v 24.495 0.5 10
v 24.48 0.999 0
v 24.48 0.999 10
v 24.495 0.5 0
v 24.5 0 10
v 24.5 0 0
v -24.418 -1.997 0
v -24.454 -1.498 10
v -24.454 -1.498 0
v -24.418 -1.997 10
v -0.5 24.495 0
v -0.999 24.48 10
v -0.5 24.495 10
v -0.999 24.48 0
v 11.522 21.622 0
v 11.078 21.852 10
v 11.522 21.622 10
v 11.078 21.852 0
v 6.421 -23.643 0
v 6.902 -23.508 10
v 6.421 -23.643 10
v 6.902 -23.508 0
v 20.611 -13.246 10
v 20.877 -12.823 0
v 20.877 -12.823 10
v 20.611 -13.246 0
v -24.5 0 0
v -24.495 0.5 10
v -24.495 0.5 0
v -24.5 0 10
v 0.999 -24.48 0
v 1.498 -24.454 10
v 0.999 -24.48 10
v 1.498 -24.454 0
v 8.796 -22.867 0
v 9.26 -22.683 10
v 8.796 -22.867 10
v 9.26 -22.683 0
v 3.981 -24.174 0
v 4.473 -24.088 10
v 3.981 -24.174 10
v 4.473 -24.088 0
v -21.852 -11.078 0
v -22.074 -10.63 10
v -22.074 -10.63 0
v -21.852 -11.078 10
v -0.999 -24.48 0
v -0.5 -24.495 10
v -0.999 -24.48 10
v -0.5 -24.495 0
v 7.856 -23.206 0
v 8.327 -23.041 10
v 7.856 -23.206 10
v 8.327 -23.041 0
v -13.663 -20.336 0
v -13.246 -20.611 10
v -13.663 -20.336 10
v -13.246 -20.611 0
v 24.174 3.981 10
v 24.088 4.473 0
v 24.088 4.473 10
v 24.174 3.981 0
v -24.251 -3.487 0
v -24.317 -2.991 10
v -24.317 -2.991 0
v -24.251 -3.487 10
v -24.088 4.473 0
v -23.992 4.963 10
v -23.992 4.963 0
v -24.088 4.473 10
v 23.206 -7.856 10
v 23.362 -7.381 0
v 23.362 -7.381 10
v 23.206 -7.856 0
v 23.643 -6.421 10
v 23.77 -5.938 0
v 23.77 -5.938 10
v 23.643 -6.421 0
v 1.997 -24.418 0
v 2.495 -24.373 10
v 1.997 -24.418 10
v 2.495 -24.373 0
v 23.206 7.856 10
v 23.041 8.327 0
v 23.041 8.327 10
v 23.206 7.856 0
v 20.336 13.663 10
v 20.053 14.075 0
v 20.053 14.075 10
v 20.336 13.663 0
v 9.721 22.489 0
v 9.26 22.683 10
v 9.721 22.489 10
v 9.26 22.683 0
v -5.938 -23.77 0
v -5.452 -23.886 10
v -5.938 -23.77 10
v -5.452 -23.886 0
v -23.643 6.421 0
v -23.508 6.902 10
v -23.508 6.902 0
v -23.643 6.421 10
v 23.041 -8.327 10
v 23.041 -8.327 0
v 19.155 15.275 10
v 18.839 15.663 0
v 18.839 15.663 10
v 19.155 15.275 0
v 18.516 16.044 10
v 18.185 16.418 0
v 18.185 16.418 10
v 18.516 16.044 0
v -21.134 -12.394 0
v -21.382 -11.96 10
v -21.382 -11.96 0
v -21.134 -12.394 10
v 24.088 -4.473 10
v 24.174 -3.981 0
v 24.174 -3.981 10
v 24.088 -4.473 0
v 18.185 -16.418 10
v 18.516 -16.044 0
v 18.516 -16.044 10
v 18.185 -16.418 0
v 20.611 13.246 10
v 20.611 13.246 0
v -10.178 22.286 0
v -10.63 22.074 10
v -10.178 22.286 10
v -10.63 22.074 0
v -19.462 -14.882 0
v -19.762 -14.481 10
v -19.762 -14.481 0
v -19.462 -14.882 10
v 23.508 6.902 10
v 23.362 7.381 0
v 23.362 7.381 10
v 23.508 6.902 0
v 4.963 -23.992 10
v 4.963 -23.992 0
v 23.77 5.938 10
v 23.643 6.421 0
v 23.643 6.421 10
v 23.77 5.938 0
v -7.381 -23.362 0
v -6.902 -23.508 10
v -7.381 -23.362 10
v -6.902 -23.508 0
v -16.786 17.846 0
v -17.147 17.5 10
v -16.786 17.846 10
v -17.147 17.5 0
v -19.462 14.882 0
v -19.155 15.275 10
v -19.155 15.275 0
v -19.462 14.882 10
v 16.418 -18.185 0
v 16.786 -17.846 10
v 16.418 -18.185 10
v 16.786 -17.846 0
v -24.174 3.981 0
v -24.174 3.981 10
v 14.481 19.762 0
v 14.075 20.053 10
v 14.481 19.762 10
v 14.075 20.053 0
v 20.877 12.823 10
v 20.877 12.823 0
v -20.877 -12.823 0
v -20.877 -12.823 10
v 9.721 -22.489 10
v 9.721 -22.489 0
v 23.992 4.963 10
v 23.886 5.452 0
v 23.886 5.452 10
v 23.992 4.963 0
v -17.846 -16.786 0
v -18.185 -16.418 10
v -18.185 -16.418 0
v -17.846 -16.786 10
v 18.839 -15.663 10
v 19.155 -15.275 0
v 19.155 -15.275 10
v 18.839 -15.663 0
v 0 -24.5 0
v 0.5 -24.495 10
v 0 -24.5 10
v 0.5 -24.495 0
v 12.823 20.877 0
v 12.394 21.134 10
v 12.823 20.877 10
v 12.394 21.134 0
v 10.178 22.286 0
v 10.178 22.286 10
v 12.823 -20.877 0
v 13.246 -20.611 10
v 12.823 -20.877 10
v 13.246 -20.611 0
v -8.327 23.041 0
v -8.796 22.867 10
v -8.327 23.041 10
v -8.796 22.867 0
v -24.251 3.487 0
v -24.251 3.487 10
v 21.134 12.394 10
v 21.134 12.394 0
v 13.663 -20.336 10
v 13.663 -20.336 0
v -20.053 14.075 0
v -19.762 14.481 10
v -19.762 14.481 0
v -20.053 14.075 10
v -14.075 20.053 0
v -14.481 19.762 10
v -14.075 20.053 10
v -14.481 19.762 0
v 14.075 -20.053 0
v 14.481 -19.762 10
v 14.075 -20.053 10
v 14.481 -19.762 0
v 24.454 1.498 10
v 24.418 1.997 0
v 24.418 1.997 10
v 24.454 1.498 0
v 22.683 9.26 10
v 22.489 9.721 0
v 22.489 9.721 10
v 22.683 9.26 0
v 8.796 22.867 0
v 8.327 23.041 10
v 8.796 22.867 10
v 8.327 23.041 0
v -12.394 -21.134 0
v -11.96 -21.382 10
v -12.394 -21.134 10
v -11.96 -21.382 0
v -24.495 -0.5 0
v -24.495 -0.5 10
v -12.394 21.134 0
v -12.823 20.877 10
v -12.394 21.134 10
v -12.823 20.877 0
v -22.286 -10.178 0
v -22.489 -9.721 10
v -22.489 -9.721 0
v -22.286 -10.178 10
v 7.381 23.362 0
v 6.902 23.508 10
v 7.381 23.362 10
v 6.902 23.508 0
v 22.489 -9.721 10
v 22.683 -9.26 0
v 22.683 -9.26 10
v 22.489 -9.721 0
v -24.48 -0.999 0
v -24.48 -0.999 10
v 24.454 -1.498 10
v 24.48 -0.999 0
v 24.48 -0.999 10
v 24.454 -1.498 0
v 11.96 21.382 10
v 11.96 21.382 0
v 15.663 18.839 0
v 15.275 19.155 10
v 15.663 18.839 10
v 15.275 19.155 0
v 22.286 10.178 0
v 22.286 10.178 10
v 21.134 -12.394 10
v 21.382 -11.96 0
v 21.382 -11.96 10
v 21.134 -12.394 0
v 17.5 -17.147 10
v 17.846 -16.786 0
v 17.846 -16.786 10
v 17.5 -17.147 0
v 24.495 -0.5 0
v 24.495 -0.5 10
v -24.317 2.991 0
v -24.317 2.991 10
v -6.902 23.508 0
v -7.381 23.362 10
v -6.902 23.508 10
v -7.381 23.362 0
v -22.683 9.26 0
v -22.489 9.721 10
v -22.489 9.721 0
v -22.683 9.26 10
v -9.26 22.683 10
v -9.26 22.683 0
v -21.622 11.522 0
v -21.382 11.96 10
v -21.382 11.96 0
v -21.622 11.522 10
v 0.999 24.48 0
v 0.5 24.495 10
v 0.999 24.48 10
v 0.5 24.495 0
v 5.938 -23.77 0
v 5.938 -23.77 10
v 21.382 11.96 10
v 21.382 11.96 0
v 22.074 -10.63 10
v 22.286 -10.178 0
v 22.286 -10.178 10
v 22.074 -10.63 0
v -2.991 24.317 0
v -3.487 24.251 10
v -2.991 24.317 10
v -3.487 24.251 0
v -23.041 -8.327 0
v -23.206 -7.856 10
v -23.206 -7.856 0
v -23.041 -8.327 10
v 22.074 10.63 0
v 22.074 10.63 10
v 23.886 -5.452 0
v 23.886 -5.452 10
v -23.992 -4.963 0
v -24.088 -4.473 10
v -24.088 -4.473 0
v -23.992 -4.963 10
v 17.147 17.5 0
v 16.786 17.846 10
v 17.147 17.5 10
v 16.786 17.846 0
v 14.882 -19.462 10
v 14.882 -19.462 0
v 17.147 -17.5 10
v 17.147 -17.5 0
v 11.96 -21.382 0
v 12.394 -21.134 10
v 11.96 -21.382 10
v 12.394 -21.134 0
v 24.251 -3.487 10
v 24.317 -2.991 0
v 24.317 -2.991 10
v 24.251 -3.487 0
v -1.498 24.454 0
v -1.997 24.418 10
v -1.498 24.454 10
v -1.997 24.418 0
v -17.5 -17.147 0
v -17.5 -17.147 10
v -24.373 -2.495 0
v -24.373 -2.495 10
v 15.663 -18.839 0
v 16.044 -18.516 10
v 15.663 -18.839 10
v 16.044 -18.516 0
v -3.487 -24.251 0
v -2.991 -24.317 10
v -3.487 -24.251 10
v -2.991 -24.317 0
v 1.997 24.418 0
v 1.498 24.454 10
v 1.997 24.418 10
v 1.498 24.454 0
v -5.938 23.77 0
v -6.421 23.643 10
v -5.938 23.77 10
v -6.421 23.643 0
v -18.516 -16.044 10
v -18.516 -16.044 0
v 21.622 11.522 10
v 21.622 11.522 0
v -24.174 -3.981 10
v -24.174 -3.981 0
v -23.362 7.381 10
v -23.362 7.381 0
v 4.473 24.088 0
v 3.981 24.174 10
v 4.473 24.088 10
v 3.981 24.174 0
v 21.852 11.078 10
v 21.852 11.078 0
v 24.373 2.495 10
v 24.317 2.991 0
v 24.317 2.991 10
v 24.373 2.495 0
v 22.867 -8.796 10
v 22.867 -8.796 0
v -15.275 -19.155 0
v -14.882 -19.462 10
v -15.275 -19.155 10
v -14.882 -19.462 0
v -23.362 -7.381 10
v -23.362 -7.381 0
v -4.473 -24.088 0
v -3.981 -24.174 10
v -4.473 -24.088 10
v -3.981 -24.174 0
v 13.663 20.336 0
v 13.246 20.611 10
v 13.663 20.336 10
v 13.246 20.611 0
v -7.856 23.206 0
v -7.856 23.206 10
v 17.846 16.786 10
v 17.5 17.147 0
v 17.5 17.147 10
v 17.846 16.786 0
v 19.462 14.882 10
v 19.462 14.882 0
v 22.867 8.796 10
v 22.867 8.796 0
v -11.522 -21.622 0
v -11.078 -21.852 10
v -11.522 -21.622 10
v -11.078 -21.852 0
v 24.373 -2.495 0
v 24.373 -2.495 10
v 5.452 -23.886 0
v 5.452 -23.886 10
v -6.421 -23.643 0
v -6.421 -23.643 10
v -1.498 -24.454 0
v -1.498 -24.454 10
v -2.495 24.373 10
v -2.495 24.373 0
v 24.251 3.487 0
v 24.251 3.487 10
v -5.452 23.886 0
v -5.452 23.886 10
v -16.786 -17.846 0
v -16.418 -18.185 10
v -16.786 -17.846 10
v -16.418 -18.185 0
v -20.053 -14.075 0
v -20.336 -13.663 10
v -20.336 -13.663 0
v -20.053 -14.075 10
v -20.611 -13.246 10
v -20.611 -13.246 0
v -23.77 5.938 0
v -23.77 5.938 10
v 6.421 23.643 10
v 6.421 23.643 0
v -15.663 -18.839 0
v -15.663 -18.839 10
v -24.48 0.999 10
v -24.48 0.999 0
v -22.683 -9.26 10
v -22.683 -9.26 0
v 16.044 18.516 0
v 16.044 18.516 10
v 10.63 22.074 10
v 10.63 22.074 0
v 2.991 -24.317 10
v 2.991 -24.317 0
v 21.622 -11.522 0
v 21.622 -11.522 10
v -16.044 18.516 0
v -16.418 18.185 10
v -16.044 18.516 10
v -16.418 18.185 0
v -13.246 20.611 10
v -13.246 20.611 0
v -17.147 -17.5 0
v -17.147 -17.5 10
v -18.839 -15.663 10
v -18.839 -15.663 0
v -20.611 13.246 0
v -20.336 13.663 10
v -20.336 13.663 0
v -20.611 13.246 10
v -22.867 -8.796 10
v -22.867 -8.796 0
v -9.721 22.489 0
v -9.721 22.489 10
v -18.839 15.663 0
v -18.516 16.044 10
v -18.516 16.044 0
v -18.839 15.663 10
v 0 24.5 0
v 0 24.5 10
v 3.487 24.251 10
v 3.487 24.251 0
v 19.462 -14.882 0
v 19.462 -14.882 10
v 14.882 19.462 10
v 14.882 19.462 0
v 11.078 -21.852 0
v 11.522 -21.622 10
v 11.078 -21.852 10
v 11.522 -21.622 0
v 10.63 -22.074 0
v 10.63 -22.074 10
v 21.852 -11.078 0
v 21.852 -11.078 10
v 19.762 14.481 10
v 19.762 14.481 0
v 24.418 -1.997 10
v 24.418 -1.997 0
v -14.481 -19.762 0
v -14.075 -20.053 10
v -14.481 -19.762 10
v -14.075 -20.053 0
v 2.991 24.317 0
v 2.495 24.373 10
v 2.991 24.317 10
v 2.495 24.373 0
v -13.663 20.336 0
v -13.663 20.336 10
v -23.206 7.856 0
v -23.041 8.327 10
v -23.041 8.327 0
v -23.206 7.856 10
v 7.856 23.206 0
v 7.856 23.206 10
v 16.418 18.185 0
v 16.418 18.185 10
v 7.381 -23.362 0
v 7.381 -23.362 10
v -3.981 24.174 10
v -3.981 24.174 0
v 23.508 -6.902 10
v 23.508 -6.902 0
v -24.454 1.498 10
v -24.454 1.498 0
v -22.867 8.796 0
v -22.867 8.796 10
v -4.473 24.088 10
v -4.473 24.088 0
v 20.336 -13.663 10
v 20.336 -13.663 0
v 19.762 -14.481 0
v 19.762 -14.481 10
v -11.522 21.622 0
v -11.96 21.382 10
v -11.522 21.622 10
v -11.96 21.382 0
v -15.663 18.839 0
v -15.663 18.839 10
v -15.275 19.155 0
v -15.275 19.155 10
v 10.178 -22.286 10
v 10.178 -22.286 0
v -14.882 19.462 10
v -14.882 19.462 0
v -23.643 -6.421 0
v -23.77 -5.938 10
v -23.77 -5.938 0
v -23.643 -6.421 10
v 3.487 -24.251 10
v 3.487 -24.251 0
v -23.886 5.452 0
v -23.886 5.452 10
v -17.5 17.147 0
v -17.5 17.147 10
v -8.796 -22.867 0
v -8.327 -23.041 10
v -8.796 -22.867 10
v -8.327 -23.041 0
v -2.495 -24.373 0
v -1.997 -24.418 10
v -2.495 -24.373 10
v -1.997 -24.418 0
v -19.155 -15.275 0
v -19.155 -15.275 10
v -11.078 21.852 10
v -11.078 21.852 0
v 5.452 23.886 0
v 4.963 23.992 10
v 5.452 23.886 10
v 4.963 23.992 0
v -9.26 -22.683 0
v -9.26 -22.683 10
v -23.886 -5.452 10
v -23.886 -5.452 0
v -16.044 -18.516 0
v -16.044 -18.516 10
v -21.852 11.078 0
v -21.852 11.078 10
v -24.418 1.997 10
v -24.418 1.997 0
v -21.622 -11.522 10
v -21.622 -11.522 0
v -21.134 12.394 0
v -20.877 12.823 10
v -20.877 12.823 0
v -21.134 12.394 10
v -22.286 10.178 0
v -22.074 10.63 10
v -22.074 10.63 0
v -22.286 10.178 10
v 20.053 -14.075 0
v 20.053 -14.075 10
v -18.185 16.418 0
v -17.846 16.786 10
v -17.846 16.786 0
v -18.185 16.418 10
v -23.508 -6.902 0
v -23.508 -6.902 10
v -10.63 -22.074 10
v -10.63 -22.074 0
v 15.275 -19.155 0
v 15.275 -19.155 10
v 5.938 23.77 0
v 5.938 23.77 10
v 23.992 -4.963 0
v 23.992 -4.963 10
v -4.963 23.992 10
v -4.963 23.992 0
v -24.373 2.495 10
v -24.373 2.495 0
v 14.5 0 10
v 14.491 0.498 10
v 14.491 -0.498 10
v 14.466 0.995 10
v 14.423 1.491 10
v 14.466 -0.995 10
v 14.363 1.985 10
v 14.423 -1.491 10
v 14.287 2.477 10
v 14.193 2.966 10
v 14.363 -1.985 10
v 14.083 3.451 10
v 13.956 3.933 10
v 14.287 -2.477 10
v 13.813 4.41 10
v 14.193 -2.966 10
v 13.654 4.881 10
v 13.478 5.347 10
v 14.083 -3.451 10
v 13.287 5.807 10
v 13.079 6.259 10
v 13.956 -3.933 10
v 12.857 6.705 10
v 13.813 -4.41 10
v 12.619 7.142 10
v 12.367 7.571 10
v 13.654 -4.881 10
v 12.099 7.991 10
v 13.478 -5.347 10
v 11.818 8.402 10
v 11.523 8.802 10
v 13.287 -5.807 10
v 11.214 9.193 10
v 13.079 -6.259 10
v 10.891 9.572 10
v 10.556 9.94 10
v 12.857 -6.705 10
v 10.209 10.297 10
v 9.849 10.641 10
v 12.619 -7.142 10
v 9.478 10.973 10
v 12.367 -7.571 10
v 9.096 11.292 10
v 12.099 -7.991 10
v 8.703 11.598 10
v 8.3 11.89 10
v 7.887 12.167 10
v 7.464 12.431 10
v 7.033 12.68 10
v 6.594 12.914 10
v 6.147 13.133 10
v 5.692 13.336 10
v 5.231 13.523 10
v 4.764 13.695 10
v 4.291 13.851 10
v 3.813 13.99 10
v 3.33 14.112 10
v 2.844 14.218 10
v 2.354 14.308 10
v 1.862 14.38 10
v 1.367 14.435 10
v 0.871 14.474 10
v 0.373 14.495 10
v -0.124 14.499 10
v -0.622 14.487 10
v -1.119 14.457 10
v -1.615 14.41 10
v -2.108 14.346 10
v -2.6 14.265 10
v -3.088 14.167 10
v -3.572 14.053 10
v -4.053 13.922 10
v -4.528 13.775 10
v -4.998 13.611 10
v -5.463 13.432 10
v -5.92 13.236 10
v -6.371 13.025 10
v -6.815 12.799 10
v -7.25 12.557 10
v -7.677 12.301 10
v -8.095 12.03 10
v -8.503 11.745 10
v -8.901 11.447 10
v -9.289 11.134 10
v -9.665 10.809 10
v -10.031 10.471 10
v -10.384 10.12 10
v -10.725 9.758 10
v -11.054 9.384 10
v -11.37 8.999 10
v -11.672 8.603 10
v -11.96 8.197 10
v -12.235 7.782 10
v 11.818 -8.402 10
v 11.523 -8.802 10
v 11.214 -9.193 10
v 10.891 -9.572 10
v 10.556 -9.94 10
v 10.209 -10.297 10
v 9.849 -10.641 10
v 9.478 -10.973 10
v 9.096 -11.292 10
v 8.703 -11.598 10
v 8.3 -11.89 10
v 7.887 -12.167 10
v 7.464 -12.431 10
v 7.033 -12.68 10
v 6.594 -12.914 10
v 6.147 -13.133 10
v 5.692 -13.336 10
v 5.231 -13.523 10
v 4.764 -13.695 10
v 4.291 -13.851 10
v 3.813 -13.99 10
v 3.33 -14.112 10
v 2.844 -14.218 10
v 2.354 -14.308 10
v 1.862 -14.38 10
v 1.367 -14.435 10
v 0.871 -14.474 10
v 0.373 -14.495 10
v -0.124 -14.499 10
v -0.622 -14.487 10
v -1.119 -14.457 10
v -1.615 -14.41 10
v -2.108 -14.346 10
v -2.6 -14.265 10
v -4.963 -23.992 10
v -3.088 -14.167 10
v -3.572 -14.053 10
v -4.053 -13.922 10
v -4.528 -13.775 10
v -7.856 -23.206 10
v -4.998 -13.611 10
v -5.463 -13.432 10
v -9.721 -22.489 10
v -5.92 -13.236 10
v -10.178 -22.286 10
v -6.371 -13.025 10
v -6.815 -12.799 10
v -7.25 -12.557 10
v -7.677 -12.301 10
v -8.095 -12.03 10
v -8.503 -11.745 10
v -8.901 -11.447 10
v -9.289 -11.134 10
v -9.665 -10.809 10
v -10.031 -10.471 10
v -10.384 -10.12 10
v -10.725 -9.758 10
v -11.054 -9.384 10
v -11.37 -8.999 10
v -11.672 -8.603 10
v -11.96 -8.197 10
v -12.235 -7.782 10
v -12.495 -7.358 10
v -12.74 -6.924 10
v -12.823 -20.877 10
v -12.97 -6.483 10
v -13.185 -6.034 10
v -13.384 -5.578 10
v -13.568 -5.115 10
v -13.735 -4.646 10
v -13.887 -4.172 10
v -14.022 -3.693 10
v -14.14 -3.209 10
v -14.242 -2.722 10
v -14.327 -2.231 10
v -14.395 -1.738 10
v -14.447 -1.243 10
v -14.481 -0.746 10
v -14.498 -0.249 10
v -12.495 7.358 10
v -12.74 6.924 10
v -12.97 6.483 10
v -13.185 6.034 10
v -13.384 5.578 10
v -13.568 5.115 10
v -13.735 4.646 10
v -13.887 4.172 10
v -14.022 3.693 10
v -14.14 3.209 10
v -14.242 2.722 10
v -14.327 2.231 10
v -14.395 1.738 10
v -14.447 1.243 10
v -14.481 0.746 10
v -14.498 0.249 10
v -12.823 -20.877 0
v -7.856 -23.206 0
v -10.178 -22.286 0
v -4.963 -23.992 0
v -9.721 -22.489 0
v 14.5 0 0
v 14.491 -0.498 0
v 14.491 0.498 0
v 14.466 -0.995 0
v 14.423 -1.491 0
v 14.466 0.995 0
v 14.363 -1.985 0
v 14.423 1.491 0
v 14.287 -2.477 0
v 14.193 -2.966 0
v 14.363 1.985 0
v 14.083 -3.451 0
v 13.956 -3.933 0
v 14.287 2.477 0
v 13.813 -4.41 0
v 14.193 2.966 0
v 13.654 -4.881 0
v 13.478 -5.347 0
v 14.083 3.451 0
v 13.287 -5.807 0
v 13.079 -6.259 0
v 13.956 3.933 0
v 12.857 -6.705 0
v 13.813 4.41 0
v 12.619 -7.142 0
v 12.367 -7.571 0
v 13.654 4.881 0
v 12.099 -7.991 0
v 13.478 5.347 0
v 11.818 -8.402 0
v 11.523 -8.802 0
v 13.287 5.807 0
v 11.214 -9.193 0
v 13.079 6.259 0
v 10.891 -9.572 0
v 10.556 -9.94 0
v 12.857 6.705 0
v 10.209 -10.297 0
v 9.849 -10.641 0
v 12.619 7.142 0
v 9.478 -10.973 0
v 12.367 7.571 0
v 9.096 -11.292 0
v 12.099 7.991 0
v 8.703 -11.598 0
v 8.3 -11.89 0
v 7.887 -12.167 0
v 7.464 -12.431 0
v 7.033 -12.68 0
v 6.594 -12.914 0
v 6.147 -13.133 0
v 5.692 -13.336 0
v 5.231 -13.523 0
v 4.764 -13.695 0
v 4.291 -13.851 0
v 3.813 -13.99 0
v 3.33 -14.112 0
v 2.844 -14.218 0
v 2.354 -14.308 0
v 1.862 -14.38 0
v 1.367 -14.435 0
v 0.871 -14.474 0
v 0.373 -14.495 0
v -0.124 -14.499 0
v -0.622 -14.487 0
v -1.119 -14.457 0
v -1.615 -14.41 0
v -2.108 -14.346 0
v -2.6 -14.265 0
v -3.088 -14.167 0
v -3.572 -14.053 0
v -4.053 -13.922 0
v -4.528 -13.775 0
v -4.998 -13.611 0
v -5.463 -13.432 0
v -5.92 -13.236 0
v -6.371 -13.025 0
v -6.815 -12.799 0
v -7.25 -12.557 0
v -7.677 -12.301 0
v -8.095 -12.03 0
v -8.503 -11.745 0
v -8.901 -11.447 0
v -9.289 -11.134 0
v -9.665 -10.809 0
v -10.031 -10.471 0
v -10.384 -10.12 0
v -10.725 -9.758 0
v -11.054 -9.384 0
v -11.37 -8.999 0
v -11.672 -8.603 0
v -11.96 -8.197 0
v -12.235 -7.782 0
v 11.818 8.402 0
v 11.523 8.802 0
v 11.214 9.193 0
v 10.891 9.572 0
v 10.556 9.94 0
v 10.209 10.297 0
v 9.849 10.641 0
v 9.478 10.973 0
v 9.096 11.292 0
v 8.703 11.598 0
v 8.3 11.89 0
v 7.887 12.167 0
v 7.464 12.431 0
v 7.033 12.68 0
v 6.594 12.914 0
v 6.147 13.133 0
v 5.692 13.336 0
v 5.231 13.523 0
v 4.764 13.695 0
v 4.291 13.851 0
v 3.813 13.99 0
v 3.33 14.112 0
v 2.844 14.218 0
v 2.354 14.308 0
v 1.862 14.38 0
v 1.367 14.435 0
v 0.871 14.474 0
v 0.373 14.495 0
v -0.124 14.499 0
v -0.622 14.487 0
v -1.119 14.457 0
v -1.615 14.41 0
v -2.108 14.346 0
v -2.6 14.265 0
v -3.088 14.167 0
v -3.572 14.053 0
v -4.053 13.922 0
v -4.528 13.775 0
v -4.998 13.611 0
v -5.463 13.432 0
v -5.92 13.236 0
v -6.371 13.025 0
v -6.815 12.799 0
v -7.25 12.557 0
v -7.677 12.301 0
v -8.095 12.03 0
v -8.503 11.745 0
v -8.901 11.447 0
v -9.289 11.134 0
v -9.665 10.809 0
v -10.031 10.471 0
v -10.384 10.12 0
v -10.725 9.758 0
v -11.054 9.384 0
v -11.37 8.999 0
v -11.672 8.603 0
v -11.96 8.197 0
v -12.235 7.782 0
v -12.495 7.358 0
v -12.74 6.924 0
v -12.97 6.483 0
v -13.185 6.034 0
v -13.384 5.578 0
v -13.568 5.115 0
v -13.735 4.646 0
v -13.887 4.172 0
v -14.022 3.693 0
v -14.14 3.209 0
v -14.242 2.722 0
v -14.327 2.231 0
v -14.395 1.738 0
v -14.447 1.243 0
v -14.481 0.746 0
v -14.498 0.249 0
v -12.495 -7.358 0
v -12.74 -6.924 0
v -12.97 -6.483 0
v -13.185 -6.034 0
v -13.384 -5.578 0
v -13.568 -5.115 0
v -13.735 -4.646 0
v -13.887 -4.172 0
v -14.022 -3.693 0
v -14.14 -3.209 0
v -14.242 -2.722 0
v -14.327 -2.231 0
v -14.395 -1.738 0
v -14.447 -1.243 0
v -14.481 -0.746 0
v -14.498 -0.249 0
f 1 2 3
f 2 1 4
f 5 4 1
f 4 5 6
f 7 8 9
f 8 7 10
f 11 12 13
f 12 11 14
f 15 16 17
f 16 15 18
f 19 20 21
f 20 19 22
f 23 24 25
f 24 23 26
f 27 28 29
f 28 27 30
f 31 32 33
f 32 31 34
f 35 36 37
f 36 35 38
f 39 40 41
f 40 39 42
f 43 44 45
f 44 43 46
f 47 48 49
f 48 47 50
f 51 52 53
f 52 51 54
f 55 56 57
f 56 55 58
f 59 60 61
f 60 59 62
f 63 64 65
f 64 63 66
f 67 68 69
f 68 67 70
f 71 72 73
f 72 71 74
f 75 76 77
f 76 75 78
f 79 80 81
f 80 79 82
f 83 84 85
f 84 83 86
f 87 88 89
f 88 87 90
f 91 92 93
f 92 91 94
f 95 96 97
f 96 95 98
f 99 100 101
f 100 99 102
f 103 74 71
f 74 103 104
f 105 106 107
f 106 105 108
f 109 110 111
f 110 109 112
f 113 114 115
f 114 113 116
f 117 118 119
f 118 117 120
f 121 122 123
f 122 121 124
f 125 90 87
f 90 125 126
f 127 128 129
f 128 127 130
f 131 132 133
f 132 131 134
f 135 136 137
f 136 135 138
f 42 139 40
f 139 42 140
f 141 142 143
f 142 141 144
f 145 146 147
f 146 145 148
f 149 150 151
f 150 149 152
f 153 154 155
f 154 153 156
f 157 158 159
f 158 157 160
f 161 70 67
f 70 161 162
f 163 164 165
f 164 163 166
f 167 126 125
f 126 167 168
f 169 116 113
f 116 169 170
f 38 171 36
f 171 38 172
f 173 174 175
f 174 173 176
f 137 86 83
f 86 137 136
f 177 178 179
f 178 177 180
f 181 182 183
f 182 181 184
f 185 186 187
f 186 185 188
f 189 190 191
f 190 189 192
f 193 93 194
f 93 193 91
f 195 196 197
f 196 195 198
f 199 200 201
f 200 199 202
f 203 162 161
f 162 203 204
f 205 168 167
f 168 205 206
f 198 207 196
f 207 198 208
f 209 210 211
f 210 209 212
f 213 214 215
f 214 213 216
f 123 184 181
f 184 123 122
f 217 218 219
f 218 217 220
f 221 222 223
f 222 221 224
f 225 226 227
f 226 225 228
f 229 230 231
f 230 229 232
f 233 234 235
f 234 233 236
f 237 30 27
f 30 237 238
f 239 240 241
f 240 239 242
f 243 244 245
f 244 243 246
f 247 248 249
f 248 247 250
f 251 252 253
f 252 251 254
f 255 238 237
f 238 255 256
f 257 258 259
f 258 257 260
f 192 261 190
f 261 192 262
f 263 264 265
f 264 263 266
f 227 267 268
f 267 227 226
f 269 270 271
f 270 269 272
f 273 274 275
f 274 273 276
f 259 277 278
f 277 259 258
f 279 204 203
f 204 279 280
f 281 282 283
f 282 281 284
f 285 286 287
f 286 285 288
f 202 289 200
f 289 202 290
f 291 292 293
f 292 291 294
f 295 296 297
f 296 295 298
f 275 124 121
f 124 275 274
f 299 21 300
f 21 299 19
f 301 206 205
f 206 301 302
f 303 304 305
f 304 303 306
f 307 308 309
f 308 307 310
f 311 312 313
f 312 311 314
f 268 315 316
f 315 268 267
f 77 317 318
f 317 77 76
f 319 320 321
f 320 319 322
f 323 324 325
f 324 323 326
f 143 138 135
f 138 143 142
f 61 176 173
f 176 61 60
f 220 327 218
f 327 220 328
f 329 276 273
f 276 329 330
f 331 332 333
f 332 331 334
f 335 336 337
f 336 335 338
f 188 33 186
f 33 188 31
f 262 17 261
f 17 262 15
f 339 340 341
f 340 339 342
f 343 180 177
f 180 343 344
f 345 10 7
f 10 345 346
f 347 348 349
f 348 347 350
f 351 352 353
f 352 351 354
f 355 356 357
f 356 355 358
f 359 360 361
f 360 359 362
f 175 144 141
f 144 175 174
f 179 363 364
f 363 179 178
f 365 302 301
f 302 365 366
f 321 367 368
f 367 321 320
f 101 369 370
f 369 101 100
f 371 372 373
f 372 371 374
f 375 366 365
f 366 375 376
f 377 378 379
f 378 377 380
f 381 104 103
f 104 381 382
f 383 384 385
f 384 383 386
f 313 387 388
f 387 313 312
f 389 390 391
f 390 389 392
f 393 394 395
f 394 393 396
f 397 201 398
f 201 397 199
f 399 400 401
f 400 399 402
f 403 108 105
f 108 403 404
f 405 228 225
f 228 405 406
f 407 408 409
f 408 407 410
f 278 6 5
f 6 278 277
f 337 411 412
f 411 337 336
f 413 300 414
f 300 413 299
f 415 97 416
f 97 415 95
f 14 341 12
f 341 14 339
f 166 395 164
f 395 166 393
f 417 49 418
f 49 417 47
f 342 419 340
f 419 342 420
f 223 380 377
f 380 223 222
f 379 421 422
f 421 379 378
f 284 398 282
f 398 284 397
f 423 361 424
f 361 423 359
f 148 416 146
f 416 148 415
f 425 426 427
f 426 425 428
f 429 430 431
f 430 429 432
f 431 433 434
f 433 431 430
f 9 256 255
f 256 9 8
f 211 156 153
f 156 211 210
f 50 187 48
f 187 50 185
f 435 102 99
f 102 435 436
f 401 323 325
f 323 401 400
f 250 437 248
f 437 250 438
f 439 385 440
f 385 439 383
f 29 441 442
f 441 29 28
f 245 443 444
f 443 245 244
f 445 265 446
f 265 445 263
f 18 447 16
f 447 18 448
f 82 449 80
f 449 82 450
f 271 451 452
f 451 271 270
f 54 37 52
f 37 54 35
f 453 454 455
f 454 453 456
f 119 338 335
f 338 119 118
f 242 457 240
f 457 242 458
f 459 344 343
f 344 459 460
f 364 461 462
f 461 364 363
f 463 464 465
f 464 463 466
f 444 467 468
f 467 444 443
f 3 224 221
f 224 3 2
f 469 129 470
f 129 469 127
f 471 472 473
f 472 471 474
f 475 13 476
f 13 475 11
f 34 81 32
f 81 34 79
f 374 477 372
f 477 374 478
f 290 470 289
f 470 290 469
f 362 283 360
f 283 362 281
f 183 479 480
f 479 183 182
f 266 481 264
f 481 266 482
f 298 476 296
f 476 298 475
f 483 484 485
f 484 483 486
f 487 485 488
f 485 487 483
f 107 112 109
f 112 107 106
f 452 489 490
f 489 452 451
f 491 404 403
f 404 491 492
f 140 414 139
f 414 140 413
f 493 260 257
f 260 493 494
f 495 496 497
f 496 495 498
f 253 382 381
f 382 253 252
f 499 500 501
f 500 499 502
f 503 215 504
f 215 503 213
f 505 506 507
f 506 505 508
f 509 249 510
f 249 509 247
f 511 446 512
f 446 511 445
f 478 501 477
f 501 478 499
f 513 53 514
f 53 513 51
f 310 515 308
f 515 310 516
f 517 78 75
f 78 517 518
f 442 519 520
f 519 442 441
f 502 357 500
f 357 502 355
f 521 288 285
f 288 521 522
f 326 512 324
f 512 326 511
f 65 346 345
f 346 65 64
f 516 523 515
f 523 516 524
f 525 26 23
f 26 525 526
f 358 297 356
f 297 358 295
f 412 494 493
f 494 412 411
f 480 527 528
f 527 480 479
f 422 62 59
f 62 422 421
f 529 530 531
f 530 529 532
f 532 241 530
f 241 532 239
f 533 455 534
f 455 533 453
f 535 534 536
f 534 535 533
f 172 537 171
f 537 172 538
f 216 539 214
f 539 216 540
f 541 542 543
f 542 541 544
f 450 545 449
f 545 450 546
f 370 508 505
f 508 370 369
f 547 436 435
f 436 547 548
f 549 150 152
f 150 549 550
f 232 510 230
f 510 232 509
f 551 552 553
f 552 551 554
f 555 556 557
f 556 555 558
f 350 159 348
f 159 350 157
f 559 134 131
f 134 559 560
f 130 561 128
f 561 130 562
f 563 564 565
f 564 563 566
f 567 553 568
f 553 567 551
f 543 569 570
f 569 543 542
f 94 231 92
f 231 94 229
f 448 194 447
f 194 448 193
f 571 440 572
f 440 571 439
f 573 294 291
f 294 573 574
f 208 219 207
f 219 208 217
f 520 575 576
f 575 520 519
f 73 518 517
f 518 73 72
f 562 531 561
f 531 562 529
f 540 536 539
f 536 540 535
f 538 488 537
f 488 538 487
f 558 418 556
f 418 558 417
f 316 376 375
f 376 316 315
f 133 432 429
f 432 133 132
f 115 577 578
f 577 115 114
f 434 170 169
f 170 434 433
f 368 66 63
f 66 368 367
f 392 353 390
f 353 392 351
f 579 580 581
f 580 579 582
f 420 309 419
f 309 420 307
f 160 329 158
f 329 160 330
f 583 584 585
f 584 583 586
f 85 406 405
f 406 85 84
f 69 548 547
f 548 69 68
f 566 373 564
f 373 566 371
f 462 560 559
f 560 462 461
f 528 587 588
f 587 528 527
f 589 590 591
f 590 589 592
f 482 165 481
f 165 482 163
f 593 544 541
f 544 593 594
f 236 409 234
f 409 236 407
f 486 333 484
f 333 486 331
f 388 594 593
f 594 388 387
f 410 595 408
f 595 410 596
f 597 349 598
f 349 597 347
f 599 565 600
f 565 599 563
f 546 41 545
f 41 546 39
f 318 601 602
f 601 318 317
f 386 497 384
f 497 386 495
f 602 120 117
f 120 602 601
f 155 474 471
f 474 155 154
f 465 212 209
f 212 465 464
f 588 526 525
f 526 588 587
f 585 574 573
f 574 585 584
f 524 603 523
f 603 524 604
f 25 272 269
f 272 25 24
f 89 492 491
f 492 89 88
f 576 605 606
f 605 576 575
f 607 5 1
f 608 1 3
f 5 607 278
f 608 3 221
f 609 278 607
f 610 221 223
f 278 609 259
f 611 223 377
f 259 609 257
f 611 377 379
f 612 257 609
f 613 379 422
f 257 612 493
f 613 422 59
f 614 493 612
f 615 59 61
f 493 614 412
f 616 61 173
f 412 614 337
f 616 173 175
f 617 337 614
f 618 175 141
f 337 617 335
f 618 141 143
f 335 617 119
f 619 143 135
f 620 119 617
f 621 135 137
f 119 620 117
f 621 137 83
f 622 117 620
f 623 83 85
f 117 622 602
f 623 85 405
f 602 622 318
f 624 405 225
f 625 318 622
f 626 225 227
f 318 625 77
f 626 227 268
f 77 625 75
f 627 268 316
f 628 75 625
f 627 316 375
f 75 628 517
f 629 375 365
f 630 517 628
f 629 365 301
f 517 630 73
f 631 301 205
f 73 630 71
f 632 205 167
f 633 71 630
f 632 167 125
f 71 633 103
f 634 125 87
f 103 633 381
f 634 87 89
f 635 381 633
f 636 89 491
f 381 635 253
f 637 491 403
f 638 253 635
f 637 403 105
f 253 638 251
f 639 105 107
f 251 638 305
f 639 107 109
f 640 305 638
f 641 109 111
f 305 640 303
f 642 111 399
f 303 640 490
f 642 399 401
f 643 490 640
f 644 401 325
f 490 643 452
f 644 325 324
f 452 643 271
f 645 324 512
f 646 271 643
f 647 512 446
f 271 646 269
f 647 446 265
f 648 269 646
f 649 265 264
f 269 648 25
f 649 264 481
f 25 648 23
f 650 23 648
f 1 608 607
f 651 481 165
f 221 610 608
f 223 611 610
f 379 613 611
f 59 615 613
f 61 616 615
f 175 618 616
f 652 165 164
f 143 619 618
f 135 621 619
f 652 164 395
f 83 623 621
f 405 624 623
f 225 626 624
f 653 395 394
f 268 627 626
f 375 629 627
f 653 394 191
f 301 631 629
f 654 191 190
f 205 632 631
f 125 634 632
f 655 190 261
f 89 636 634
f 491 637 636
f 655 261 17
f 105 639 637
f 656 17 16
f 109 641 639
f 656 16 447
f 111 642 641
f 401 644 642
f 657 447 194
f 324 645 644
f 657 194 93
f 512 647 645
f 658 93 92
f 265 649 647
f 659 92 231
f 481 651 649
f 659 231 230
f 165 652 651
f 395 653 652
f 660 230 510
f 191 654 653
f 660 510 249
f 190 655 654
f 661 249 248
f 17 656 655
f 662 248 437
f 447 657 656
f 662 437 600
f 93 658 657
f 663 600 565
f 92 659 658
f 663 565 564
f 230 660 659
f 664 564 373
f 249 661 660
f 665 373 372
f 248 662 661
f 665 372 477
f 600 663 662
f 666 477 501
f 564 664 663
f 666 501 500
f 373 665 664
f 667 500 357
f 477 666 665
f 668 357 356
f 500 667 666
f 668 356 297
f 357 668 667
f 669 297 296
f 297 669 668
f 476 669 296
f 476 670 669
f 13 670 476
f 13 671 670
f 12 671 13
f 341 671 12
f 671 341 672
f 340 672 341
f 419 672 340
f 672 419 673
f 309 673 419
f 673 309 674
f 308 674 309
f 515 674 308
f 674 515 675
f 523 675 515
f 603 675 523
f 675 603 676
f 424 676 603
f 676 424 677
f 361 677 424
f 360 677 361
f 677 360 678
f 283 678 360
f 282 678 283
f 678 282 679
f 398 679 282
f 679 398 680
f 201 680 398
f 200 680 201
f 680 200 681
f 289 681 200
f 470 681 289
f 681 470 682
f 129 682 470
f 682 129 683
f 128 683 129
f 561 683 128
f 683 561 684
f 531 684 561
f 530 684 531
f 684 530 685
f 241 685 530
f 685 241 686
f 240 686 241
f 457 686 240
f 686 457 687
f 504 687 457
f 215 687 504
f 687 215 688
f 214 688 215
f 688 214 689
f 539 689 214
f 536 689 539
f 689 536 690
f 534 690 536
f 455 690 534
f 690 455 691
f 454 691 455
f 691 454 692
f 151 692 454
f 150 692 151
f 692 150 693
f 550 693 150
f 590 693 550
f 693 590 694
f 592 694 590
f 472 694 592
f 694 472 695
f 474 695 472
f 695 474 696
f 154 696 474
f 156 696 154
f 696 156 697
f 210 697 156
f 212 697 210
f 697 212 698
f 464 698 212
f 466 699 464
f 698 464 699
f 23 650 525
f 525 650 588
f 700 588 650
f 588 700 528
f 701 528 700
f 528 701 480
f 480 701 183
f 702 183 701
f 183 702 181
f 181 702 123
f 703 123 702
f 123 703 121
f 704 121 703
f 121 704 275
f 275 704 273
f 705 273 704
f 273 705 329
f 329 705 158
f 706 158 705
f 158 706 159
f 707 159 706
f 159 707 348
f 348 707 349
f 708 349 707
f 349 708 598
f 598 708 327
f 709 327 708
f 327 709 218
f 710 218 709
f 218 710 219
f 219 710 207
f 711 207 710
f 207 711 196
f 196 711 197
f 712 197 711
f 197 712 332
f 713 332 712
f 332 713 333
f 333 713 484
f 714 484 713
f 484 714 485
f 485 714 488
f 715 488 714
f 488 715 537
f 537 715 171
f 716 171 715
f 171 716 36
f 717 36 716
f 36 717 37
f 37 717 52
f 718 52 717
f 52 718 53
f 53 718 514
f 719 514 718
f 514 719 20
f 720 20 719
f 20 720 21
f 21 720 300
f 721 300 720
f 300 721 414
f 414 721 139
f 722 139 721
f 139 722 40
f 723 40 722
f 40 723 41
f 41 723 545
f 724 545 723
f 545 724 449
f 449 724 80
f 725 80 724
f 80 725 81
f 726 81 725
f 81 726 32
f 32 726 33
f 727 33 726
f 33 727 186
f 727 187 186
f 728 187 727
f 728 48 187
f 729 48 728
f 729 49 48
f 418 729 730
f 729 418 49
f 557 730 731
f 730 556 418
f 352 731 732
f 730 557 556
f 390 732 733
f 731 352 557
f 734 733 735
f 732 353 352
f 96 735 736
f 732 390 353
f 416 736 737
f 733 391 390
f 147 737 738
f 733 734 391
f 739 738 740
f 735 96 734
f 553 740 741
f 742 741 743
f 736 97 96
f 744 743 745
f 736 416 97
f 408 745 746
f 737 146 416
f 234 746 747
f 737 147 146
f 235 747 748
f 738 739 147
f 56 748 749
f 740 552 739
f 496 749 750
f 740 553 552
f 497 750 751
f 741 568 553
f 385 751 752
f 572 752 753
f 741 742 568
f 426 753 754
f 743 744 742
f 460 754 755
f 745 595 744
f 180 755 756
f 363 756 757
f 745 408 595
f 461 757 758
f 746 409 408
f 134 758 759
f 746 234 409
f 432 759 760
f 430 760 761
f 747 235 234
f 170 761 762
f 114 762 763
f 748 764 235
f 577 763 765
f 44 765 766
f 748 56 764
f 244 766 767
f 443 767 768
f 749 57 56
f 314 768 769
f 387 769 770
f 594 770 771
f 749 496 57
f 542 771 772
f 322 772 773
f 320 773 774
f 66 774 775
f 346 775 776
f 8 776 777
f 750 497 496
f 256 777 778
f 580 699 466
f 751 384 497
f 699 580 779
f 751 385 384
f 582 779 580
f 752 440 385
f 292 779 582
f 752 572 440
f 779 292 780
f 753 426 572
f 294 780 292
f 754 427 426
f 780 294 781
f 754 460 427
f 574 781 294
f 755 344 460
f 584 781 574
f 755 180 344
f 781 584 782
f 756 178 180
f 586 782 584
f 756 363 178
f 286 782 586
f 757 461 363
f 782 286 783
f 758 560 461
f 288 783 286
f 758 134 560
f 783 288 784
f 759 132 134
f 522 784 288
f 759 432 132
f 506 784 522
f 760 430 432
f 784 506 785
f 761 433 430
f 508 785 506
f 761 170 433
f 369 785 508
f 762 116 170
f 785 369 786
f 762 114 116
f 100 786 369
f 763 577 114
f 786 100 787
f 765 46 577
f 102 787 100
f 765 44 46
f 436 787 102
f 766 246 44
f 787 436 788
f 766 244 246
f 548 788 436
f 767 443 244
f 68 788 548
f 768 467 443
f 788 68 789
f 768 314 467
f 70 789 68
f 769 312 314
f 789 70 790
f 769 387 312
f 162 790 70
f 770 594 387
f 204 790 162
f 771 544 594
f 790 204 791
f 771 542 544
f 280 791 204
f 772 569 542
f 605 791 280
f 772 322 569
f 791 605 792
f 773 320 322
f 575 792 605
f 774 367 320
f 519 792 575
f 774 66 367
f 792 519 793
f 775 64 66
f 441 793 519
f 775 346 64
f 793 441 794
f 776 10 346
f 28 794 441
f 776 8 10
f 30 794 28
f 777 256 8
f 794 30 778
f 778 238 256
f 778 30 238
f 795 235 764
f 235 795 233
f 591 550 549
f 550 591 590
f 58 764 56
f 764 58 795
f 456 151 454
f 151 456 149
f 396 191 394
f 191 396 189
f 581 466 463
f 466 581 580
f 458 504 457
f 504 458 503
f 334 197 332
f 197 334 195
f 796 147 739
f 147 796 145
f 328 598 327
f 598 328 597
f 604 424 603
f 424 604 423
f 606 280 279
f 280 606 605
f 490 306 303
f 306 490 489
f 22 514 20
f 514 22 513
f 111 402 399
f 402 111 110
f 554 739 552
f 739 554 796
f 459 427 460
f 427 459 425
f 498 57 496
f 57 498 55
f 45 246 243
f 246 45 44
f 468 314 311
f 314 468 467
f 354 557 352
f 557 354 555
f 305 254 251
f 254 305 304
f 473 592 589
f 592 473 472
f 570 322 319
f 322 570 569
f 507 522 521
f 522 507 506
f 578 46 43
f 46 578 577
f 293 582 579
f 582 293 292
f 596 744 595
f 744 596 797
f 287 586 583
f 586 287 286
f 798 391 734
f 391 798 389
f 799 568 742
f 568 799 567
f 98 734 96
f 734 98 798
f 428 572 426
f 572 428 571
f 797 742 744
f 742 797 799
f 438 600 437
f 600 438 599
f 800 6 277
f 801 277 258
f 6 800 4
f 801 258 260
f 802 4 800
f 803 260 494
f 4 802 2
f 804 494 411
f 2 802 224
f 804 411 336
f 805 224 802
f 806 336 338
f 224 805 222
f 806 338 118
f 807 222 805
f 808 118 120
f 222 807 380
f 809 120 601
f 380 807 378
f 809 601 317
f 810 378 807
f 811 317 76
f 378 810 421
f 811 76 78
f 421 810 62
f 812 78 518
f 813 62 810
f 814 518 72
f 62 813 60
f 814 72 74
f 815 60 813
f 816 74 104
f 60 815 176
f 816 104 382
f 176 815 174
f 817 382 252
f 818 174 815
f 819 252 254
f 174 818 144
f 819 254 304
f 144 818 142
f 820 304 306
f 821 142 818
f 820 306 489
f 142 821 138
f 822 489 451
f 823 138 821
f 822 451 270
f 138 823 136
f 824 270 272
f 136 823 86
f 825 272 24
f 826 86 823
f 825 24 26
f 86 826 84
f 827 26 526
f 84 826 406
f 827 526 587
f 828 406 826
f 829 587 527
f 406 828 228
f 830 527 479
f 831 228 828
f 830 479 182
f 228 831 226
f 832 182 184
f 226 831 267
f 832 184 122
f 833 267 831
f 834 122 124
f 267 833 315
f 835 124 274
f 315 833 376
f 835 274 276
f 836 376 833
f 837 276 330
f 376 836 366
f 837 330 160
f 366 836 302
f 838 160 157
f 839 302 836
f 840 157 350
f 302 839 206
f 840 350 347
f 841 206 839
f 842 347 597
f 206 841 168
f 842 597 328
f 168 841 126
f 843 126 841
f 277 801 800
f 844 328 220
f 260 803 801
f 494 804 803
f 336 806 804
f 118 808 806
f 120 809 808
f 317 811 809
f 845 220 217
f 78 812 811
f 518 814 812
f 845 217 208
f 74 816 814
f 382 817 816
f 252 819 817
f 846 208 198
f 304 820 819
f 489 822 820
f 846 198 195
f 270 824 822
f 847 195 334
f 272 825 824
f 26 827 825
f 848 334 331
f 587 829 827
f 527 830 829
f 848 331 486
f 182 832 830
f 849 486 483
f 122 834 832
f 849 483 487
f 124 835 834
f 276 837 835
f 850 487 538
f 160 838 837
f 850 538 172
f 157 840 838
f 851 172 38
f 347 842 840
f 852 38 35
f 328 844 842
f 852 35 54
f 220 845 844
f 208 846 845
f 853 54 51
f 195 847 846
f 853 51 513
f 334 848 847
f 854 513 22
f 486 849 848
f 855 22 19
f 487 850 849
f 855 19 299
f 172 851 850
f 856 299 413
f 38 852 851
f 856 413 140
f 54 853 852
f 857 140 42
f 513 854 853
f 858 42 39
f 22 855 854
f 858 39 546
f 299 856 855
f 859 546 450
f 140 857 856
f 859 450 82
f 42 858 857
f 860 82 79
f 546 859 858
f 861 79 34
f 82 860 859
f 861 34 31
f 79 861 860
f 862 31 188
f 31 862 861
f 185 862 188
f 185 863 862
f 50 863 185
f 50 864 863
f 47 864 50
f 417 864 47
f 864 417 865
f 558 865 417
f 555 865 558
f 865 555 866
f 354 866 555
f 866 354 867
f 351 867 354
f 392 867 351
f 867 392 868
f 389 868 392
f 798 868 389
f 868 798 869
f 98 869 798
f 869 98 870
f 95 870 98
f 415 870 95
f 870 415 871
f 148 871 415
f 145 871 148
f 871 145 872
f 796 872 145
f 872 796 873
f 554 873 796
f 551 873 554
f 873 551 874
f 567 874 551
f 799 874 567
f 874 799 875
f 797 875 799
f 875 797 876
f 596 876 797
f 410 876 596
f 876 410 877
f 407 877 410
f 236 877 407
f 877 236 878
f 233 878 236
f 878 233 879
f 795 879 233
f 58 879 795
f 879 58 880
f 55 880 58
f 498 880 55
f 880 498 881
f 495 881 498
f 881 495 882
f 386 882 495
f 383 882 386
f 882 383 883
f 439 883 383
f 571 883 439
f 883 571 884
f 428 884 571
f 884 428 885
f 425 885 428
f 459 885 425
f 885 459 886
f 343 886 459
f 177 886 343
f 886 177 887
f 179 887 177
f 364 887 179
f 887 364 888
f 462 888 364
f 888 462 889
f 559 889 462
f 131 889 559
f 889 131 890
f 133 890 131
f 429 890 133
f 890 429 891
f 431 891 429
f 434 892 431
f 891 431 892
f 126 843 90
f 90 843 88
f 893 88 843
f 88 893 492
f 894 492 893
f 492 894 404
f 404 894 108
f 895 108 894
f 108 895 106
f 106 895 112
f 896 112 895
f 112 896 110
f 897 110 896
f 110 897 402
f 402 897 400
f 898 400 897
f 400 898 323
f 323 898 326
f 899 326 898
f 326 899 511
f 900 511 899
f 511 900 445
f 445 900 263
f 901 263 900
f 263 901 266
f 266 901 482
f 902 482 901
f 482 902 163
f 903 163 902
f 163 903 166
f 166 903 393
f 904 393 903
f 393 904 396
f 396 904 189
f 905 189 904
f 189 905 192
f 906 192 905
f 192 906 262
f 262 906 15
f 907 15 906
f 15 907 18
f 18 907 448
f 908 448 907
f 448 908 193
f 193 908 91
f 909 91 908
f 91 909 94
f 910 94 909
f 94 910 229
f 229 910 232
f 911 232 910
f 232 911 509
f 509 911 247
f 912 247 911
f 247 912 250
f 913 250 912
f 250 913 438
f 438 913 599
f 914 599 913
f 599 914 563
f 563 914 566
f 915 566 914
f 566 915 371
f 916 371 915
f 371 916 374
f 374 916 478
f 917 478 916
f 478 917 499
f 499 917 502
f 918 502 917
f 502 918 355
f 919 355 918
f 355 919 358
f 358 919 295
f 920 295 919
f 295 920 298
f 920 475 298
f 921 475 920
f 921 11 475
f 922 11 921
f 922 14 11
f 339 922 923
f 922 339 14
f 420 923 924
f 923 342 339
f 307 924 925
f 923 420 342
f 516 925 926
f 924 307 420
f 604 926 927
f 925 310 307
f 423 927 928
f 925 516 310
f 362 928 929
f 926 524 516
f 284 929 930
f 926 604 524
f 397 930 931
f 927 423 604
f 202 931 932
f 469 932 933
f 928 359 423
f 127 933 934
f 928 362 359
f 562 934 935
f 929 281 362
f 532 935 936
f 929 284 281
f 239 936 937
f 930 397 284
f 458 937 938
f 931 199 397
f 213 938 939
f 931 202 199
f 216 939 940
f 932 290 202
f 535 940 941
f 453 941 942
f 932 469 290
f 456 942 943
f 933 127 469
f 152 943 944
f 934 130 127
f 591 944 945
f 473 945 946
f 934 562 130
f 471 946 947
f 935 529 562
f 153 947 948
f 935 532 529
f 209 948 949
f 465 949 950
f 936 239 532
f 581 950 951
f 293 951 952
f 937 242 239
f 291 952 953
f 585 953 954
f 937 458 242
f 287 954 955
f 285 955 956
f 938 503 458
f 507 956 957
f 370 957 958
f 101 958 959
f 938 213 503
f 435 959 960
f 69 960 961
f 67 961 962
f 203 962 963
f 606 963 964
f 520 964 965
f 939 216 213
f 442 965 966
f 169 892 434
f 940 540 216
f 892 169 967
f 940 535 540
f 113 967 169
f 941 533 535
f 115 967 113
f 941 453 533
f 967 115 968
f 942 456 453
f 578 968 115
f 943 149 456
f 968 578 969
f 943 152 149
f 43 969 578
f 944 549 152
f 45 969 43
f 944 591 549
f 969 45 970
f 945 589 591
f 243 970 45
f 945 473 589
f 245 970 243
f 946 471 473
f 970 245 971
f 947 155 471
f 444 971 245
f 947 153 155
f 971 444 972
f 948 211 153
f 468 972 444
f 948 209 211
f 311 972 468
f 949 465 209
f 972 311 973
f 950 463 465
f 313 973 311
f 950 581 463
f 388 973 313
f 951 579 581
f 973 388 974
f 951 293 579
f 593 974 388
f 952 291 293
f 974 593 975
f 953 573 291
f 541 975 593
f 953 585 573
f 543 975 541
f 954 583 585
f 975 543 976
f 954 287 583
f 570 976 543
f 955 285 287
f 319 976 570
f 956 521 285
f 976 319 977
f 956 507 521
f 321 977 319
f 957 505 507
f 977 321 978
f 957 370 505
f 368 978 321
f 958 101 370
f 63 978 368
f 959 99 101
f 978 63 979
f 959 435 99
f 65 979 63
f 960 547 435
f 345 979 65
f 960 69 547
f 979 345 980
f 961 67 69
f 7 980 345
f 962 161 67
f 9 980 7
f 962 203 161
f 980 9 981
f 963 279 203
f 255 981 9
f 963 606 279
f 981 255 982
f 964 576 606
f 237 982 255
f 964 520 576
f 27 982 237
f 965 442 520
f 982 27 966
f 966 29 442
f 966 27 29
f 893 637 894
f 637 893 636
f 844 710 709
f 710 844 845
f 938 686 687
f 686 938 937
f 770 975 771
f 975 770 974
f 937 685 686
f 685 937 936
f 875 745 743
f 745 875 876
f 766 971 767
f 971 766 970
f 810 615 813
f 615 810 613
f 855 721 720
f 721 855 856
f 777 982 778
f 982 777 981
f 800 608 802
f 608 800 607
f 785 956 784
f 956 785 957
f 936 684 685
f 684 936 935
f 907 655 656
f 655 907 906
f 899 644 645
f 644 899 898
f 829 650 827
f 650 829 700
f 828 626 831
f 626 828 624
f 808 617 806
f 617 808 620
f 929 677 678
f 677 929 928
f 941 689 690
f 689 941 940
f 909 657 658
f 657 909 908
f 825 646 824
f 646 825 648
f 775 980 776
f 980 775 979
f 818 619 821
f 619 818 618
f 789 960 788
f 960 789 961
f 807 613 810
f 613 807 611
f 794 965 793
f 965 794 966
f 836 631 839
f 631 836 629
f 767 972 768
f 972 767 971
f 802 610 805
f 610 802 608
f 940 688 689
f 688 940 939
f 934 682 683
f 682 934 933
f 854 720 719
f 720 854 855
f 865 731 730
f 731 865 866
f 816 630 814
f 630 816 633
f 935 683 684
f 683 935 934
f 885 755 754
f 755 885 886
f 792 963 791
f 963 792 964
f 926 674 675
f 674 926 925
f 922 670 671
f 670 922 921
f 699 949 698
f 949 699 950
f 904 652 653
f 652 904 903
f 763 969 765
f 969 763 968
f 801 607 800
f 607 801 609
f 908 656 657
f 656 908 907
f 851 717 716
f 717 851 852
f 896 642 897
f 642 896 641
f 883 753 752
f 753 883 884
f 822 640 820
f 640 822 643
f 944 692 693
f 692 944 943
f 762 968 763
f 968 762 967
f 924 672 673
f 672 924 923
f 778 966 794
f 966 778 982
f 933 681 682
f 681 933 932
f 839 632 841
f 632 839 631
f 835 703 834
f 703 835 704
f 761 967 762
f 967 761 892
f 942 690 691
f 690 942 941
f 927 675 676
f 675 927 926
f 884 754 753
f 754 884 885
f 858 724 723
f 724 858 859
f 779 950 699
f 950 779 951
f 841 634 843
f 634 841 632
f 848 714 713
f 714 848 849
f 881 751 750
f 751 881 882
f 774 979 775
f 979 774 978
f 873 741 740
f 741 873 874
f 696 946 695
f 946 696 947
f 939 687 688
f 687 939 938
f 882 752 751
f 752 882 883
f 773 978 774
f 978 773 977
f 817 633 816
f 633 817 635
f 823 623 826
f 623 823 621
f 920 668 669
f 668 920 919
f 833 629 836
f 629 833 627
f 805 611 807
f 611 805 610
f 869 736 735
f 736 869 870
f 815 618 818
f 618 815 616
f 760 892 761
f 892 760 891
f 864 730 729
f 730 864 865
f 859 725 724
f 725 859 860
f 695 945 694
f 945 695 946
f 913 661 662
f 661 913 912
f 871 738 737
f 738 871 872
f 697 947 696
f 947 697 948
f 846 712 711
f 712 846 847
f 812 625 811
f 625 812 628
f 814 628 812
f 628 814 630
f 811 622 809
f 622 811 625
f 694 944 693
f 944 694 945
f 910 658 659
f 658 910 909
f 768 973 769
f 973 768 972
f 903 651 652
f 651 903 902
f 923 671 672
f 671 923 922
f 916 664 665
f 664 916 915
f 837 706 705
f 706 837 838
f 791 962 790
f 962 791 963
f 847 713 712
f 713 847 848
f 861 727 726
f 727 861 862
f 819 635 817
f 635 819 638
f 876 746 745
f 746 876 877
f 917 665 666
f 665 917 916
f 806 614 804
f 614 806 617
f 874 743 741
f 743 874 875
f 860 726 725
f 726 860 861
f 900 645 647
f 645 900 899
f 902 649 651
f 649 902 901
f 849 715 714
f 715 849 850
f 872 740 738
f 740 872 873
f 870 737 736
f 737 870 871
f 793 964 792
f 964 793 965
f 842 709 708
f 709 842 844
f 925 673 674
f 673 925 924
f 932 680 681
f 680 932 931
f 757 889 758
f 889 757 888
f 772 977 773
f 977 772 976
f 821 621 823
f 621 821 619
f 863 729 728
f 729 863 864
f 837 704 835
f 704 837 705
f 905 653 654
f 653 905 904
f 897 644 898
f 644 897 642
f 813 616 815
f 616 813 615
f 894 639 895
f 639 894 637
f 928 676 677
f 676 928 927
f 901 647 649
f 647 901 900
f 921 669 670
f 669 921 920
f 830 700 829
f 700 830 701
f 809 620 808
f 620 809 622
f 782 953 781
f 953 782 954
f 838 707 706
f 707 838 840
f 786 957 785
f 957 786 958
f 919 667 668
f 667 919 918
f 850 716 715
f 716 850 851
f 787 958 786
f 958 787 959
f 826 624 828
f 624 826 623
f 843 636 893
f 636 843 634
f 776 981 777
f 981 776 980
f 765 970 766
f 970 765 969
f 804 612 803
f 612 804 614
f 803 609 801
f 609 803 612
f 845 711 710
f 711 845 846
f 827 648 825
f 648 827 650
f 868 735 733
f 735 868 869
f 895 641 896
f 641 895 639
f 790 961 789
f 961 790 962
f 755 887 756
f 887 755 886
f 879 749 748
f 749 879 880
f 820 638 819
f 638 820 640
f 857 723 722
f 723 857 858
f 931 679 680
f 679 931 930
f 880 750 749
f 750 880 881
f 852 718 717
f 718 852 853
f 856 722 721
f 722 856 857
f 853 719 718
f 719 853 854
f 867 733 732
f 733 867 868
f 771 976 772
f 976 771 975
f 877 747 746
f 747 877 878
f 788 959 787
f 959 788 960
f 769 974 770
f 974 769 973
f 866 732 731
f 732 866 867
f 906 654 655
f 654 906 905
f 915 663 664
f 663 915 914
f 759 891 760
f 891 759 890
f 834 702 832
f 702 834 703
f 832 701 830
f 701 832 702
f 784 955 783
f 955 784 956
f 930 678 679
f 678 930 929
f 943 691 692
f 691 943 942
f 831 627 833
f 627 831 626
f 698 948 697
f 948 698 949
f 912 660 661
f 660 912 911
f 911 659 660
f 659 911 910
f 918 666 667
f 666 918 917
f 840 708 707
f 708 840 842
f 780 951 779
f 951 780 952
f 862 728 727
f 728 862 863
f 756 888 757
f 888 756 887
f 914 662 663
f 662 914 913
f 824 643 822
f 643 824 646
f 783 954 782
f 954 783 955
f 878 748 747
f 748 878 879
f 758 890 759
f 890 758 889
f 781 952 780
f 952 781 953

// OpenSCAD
$fa=0.5; // default minimum facet angle is now 0.5
$fs=0.5; // default minimum facet size is now 0.5 mm
r=49/2;
h=10;
w=10;

difference() {
    cylinder(h,r,r);
    cylinder(h*1.02,r-w,r-w);
}
